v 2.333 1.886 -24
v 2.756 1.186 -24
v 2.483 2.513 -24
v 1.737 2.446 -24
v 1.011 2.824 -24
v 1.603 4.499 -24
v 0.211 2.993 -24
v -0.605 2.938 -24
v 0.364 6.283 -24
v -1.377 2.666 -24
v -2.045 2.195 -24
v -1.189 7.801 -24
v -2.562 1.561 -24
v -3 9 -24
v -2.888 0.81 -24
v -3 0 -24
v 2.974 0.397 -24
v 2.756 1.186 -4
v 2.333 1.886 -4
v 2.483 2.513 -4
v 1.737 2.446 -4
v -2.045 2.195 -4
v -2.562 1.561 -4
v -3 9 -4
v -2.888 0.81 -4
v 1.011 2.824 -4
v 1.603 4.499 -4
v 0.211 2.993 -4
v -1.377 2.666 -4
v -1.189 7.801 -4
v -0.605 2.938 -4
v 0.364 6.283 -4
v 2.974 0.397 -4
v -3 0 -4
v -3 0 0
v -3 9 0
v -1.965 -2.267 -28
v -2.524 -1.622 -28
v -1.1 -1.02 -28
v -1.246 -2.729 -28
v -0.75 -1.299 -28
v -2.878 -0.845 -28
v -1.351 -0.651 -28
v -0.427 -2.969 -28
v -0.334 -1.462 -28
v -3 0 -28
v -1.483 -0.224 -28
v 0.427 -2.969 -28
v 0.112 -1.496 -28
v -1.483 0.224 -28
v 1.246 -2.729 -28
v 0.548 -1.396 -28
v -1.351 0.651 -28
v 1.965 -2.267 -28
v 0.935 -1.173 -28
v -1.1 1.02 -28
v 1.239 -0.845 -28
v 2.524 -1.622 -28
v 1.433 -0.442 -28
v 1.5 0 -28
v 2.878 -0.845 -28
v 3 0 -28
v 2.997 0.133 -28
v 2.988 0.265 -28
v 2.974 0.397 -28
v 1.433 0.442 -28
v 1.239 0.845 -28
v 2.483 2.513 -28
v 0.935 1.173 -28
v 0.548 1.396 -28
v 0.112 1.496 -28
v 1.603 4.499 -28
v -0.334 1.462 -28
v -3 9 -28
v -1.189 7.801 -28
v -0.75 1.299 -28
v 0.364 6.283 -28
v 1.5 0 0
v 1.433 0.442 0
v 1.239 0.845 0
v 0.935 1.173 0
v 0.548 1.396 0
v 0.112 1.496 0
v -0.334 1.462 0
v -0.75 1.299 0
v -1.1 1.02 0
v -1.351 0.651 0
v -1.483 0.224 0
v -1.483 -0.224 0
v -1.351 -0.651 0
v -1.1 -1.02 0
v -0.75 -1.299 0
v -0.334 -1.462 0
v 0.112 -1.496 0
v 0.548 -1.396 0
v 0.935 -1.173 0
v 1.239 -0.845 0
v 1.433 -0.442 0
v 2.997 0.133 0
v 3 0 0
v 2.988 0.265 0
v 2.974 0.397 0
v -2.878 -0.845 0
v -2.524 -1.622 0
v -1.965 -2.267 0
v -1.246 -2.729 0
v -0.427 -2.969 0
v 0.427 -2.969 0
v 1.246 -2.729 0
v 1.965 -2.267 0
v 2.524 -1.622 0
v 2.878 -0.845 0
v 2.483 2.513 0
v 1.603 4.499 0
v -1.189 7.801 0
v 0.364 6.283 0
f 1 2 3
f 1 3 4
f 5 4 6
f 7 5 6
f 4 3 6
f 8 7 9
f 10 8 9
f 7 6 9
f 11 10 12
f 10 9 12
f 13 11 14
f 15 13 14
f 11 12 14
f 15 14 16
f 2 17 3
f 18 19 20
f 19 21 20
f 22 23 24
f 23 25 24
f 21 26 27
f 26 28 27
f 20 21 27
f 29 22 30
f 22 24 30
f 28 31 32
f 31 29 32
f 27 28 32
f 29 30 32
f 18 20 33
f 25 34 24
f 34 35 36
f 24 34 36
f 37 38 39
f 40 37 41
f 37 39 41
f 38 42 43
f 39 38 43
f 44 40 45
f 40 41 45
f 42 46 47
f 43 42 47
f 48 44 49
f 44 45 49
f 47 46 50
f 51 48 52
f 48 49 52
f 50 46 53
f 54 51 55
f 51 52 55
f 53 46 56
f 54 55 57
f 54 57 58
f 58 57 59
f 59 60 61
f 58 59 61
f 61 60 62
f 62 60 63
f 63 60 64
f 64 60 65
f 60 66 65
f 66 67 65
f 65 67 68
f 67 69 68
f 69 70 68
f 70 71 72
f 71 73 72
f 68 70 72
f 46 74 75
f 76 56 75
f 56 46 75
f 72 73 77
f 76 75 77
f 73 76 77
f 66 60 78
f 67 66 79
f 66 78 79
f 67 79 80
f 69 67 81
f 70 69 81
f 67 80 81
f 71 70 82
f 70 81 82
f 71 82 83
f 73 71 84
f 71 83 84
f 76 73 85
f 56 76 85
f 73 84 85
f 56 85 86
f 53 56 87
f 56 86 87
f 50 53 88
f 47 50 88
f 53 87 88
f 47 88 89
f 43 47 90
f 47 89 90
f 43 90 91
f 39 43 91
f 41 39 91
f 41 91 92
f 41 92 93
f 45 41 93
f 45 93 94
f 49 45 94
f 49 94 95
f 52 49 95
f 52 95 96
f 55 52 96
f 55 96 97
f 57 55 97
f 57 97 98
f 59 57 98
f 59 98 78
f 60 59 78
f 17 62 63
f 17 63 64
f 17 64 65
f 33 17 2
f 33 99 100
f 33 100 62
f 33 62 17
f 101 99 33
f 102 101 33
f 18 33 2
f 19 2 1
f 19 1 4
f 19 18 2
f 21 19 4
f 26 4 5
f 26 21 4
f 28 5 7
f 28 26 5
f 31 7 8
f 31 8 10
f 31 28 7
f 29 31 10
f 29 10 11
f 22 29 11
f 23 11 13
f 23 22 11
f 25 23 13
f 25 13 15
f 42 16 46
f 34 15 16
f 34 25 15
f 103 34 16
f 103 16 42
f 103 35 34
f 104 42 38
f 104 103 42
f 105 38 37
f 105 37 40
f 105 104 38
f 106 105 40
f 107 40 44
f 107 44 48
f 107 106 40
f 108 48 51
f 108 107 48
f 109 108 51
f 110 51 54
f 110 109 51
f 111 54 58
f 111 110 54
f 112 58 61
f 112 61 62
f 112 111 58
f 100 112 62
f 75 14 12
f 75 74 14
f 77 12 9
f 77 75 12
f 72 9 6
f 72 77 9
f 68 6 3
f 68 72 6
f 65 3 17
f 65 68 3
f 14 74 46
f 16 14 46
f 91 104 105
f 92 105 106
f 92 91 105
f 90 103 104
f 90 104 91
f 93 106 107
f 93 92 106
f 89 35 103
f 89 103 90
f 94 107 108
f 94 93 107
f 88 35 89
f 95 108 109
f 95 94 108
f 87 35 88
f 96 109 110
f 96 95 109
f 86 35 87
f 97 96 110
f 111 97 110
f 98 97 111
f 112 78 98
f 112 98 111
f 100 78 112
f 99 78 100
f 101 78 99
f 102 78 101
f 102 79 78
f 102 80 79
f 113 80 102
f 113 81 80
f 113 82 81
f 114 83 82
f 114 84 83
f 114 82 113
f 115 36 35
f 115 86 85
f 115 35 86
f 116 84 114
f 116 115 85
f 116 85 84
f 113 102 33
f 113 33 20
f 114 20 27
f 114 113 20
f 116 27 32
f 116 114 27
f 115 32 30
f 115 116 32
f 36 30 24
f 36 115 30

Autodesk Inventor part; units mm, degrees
ref_plane "YZ Plane" through (0, 0, 0) normal (1, 0, 0) x (0, 1, 0)
ref_plane "XZ Plane" through (0, 0, 0) normal (0, 1, 0) x (-1, 0, 0)
sketch "草图1" plane through (0, 0, 0) normal (0, 0, 1) x (1, 0, 0)
  circle A0 centre (0, 0) radius 1.5
  circle A1 centre (0, 0) radius 3
  line L0 (-3, 0) -> (-3, 9)
  arc A2 (2.9736, 0.3973) -> (-3, 9) centre (-8.3955, -1.1218) ccw
  dimension "d0" = 3
  dimension "d1" = 6
  dimension "d2" = 9
sketch "草图2" plane through (0, 0, 0) normal (0, 1, 0) x (-1, 0, 0)
  line L0 (3, 0) -> (3, -28)
  line L1 (3, 0) -> (3, -4)
  line L2 (3, -28) -> (3, -24)
  point P0 (0, 0)
  point P1 (3, -14)
  dimension "d3" = 28
  dimension "d6" = 4
  dimension "d7" = 4
extrude "拉伸1" add sketch "草图1" against normal blind 28 contours A1
extrude "拉伸2" add sketch "草图1" against normal blind 4 contours A1 L0 A2
ref_plane "工作平面1" through (0, 0, -14) normal (0, 0, 1) x (1, 0, 0)
mirror "镜像1" about plane through (0, 0, -14) normal (0, 0, 1) of "拉伸2"
thread "螺纹8" size "M3x0.5" class "6H" standard "ANSI Metric M Profile" full length
